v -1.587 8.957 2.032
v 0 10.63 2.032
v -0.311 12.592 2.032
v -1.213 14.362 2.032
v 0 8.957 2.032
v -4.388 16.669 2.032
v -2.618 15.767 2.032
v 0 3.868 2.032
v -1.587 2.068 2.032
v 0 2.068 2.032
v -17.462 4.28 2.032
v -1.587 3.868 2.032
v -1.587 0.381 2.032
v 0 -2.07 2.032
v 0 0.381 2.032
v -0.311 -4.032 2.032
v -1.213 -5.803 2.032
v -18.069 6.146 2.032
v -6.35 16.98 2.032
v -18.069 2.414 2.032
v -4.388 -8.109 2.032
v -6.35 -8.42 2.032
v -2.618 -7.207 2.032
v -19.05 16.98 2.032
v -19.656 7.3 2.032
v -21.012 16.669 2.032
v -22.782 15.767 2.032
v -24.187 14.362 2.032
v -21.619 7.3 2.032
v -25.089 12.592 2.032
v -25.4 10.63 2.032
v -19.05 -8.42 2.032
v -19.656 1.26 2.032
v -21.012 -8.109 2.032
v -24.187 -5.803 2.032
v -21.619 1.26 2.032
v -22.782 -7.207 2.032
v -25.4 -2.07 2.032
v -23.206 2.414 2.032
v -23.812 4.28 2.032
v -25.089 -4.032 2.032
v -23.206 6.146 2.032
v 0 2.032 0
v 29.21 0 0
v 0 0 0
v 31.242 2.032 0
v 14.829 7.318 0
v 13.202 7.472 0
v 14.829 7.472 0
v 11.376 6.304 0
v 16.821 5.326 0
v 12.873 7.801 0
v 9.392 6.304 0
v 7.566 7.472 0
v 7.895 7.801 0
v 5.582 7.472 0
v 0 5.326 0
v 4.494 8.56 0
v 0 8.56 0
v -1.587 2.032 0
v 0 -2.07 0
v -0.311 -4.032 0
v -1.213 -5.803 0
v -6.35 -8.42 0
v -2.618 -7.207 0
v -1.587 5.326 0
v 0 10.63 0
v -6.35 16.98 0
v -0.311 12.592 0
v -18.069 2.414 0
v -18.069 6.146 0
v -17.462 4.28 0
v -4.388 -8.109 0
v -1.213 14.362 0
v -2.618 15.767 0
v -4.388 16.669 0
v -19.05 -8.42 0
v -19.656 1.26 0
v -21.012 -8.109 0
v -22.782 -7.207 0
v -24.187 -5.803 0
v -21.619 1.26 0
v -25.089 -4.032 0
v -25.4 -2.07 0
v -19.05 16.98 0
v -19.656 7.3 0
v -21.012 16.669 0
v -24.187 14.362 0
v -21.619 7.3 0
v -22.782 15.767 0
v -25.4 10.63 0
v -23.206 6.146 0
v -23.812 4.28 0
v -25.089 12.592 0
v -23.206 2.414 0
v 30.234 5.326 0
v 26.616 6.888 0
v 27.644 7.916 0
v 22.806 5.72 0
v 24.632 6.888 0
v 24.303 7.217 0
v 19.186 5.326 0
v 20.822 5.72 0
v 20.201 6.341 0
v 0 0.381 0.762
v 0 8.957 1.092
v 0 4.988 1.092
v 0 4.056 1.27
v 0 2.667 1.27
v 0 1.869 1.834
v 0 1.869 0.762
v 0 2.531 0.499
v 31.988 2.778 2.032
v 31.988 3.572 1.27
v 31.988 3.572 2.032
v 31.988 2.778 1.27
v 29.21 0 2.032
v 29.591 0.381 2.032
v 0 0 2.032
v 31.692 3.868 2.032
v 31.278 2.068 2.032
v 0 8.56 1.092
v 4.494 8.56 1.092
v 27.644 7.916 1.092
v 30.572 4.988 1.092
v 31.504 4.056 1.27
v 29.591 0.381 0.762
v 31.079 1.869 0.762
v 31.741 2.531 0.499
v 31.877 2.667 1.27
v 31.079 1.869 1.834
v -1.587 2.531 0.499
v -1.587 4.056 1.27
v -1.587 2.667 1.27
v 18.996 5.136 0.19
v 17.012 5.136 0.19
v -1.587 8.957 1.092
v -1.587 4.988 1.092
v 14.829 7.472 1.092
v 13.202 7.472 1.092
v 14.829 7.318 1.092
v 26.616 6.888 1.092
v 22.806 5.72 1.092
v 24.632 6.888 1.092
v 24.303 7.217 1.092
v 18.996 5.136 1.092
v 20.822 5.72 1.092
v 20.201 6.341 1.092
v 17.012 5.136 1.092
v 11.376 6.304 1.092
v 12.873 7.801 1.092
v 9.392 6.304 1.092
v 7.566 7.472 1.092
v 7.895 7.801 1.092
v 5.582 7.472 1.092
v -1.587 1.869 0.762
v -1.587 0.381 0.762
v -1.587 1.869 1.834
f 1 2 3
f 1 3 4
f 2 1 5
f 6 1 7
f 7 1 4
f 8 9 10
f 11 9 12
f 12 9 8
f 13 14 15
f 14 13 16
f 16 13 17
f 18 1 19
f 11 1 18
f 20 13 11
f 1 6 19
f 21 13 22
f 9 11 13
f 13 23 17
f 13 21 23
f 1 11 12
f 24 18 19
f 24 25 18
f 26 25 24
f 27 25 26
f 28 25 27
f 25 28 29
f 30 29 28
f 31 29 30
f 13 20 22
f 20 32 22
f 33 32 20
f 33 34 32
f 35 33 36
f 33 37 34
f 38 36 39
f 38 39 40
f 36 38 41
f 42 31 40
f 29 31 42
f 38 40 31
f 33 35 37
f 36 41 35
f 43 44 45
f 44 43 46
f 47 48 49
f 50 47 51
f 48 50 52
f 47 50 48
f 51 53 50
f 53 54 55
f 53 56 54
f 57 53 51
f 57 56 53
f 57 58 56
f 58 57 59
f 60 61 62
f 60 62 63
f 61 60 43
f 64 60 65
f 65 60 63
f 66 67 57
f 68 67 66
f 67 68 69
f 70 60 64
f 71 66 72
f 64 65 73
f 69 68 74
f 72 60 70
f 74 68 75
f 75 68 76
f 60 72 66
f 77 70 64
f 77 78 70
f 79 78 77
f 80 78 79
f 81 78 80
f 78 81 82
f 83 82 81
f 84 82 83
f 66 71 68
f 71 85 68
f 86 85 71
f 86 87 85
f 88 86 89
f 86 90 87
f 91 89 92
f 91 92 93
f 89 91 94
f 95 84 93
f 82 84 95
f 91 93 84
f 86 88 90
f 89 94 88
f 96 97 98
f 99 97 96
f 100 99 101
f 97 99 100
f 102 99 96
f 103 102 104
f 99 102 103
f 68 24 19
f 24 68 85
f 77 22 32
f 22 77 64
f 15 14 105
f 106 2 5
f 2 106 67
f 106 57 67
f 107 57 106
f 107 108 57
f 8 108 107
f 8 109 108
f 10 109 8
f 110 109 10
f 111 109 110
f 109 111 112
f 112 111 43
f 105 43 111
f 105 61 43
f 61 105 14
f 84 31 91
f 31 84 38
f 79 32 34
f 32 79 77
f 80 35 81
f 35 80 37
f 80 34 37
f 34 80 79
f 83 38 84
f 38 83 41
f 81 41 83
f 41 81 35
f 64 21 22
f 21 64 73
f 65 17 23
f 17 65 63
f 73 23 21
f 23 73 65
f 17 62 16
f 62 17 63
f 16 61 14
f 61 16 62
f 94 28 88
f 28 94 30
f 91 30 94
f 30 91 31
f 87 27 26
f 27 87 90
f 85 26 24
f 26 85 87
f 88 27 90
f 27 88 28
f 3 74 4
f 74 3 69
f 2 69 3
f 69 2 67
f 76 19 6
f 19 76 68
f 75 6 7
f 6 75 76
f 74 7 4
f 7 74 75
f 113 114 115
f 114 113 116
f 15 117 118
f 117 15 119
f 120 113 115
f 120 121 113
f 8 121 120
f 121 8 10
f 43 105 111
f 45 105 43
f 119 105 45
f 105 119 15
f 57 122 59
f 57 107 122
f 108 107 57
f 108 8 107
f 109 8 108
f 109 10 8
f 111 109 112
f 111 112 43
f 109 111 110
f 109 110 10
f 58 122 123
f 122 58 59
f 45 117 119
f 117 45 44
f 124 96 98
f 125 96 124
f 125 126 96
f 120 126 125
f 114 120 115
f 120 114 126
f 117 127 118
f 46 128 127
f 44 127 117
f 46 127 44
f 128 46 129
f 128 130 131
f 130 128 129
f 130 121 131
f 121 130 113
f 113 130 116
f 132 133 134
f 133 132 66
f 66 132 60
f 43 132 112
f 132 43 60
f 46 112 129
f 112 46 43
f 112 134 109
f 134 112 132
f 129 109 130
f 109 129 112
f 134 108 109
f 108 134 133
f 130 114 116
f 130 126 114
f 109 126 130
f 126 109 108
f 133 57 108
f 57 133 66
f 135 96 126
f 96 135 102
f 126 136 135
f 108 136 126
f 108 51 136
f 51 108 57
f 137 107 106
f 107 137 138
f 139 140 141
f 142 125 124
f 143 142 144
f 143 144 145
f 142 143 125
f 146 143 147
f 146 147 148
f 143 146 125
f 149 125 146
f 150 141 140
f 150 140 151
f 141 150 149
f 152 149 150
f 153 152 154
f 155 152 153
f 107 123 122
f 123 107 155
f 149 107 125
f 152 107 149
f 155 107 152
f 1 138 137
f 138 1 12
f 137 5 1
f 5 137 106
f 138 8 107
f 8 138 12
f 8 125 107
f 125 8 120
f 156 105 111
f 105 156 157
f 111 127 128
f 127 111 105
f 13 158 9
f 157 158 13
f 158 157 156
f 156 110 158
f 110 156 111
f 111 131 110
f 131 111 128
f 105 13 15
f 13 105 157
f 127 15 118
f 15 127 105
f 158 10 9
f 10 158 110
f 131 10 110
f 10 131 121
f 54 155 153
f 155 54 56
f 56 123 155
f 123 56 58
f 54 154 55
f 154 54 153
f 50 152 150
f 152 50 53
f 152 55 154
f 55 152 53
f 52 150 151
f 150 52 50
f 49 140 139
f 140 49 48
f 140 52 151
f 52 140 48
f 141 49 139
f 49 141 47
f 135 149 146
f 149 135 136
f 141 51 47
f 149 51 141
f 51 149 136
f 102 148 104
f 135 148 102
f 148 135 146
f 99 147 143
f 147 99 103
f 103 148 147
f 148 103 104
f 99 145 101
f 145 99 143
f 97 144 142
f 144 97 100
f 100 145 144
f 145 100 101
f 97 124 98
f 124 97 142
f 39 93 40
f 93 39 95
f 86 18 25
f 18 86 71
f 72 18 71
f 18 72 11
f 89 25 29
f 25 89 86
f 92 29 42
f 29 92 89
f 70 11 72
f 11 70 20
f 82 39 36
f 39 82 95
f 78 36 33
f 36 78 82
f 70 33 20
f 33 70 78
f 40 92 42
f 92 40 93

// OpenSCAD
// Physical Keygen for KW1 - by Nirav Patel <http://eclecti.cc>
// Revisions for KW10 - by Scott Elliott <mysd300.blogspot.com>
//
// Generate a duplicate of a Kwikset KW1 key by editing the last line of the file
// and entering in the key code of the lock.  If you don't know the key code,
// you can measure the key and compare the numbers at:
// http://web.archive.org/web/20050217020917fw_/http://dlaco.com/spacing/tips.htm
//
// This work is licensed under a Creative Commons Attribution 3.0 Unported License.

// Since the keys and locks I have were all designed in imperial units, the
// constants in this file will be defined in inches.  The mm function
// allows us to retain the proper size for exporting a metric STL.
function mm(i) = i*25.4;

module rounded(size, r) {
    union() {
        translate([r, 0, 0]) cube([size[0]-2*r, size[1], size[2]]);
        translate([0, r, 0]) cube([size[0], size[1]-2*r, size[2]]);
        translate([r, r, 0]) cylinder(h=size[2], r=r);
        translate([size[0]-r, r, 0]) cylinder(h=size[2], r=r);
        translate([r, size[1]-r, 0]) cylinder(h=size[2], r=r);
        translate([size[0]-r, size[1]-r, 0]) cylinder(h=size[2], r=r);
    }
}

module bit() {
    w = mm(1/4);
    difference() {
        translate([-w/2, 0, 0]) cube([w, mm(1), w]);
        translate([-mm(5/128), 0, 0]) rotate([0, 0, 135]) cube([w, w, w]);
        translate([mm(5/128), 0, 0]) rotate([0, 0, -45]) cube([w, w, w]);
    }
}

// Kwikset KW10, 6 pin key.  The measurements are mostly guesses based on reverse
// engineering some keys I have and some publicly available information.
module kw10(bits) {
    // You may need to adjust these to fit your specific printer settings
    thickness = mm(0.080);
    length = mm(9/8)+mm(0.15); // add sixth pin
    width = mm(0.337);
    
    shoulder = mm(0.247);
    pin_spacing = mm(0.15);
    depth_inc = mm(0.023);
    
    // A fudge factor.  Printing with your average RepRap, the bottom layer is
    // going to be squeezed larger than you want. You can make the pins
    // go slighly deeper by a fudge amount to make up for it if you aren't
    // adjusting for it elsewhere like Skeinforge or in your firmware.
    fudge = 0.3; // try 0.5 for kit printers
    
    // Handle size
    h_l = mm(1);
    h_w = mm(1);
    h_d = mm(1/16);
    difference() {
        // blade and key handle
        union() {
            translate([-h_l, -h_w/2 + width/2, 0]) rounded([h_l, h_w, thickness], mm(1/4));
            // cut a little off the tip to avoid going too long
            cube([length - mm(1/64), width, thickness]);
        }
        
        // chamfer the tip
        translate([length, mm(1/8), 0]) {
            rotate([0, 0, 45]) cube([10, 10, thickness]);
            rotate([0, 0, 225]) cube([10, 10, thickness]);
        }
        
        // put in a hole for keychain use
        translate([-h_l + mm(3/16), width/2, 0]) cylinder(h=thickness, r=mm(1/8));
        
        // cut the channels in the key.  designed more for printability than accuracy
        union() {
            translate([-h_d, mm(0.105), mm(0.025)]) rotate([225, 0, 0]) cube([length + h_d, width, width]);
            translate([-h_d, mm(0.105), mm(0.05)]) rotate([260, 0, 0]) cube([length + h_d, thickness/2, mm(1/32)]);
            translate([-h_d, mm(0.105), 0]) cube([length + h_d, mm(7/128), mm(0.05)]);
            translate([-h_d, mm(0.105) + mm(7/128), mm(0.05)]) rotate([225, 0, 0]) cube([length + h_d, mm(3/64), thickness]);
        }
        
        translate([-h_d, width - mm(9/64), mm(0.043)]) {
            cube([length + h_d, width - (width - mm(10/64)), thickness]);
            rotate([50, 0, 0]) cube([length + h_d, width, thickness]);
        }
        
        union() {
            translate([-h_d, mm(0.015), mm(0.03)]) cube([length + h_d, mm(15/256), thickness]);
            translate([-h_d, mm(0.015) + mm(13/256), thickness - mm(1/64)]) rotate([45, 0, 0]) cube([length + h_d, mm(1/16), mm(1/16)]);
        }
        
        // Do the actual bitting
        for (b = [0:5]) {
            // Kwikset doesn't have a 0 value and instead has 1 start around .008" deep
            translate([shoulder + fudge + b*pin_spacing, width - mm(0.008) - (bits[b] - 1)*depth_inc - fudge, 0]) bit();
        }
    }
}

// This sample key goes to a lock that is sitting disassembled on my desk
// Flip the key over for easy printing
*kw1([1,3,3,2,3]);
kw10([2,4,2,6,5,3]);

// Thickness from edge to keel:
// 1 = 7.96
// 2 = 7.31
// 3 = 6.84
// 4 = 6.26
// 5 = 5.67
// 6 = 5.09
// 7 = 4.50
